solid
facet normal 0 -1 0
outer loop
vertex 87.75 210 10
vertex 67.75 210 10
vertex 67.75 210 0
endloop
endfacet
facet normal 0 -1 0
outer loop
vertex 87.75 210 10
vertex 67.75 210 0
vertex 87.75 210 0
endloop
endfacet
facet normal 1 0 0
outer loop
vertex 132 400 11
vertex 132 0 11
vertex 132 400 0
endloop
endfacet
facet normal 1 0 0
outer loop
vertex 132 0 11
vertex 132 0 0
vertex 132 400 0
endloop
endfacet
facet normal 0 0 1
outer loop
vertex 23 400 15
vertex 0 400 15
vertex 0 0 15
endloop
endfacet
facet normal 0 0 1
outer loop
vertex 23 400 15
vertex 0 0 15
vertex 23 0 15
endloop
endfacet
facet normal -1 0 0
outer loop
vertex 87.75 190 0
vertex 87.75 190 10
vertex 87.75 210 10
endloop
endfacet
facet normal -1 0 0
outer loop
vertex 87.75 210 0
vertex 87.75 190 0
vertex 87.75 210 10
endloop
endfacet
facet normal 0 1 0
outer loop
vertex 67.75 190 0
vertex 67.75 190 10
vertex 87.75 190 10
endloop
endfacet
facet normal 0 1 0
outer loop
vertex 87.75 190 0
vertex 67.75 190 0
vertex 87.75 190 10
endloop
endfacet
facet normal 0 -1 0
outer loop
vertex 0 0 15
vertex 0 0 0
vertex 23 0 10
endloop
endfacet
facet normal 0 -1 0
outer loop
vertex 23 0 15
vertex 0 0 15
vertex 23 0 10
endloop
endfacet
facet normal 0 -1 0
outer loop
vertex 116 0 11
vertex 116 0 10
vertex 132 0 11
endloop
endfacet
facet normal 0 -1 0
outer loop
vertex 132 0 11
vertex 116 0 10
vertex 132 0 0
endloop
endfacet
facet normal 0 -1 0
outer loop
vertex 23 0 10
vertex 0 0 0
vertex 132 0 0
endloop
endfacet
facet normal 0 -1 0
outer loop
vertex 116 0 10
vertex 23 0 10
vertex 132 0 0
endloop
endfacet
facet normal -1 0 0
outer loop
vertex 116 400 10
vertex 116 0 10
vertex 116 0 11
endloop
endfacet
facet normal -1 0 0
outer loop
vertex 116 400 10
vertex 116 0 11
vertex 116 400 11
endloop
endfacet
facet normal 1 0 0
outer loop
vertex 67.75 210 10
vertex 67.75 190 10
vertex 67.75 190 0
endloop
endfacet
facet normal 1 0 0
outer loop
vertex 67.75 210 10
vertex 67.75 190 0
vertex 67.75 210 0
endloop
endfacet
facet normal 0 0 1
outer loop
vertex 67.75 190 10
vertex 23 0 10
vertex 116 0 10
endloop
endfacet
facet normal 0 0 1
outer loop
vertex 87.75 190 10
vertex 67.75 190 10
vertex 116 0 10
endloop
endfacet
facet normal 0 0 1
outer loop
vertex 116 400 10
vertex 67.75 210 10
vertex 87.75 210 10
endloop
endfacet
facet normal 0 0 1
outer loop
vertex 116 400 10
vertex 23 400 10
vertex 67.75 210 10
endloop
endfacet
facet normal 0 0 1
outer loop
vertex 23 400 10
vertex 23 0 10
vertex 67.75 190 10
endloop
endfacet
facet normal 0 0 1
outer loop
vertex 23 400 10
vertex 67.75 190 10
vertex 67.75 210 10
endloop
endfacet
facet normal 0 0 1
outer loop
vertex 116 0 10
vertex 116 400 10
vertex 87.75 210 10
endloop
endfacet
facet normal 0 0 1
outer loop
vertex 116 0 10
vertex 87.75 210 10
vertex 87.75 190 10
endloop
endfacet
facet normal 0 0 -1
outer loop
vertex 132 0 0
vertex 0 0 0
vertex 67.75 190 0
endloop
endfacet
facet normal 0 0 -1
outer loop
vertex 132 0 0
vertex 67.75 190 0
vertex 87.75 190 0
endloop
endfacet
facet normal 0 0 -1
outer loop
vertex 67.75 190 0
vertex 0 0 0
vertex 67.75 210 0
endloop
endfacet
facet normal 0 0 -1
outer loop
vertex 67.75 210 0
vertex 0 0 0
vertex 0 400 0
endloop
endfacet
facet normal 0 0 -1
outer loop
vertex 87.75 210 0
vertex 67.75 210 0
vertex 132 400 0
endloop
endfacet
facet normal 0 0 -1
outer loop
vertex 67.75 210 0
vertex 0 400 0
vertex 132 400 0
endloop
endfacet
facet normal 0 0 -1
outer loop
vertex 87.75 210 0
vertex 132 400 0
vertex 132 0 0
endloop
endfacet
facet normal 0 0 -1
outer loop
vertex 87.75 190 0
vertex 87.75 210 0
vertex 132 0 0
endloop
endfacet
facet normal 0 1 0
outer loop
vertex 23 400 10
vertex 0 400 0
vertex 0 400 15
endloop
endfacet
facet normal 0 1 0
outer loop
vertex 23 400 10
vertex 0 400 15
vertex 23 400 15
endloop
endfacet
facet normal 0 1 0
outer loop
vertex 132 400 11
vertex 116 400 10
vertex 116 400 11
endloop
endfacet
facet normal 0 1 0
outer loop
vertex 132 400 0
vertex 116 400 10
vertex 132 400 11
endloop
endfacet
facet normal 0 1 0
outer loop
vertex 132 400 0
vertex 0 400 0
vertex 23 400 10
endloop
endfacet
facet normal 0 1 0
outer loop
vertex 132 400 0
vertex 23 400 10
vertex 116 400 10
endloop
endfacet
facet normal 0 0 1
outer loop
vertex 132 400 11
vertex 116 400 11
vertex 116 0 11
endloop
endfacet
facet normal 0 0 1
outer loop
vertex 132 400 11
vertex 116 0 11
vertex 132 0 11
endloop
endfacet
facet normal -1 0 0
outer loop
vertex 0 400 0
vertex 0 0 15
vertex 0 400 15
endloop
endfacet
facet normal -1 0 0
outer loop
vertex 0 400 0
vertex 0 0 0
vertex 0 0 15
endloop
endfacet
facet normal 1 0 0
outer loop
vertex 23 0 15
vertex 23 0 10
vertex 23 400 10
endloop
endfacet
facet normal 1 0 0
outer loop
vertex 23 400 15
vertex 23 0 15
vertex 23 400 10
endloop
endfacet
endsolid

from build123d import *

# Parameters (mm, degrees)
SKETCH_1_W          = 132
SKETCH_1_H          = 400
EXTRUDE_1_DEPTH     = 10
SKETCH_2_W          = 23
SKETCH_2_H          = 400
EXTRUDE_2_DEPTH     = 5
SKETCH_3_W          = 16
SKETCH_3_H          = 400
EXTRUDE_3_DEPTH     = 1
SKETCH_4_W          = 20
SKETCH_4_H          = 20
CUT_EXTRUDE_1_DEPTH = 11


with BuildPart() as part:
    # ｽｹｯﾁ1 → ﾎﾞｽ - 押し出し1 (new body)
    with BuildSketch(Plane.XY):
        with Locations((66, 200)):
            Rectangle(SKETCH_1_W, SKETCH_1_H)
    extrude(amount=EXTRUDE_1_DEPTH)

    # ｽｹｯﾁ2 → ﾎﾞｽ - 押し出し2 (add)
    with BuildSketch(Plane.XY.offset(10)):
        with Locations((11.5, 200)):
            Rectangle(SKETCH_2_W, SKETCH_2_H)
    extrude(amount=EXTRUDE_2_DEPTH)

    # ｽｹｯﾁ3 → ﾎﾞｽ - 押し出し3 (add)
    with BuildSketch(Plane.XY.offset(10)):
        with Locations((124, 200)):
            Rectangle(SKETCH_3_W, SKETCH_3_H)
    extrude(amount=EXTRUDE_3_DEPTH)

    # ｽｹｯﾁ4 → ｶｯﾄ - 押し出し1 (cut, through all)
    with BuildSketch(Plane.XY.offset(10)):
        with Locations((77.75, 200)):
            Rectangle(SKETCH_4_W, SKETCH_4_H)
    extrude(amount=-CUT_EXTRUDE_1_DEPTH, mode=Mode.SUBTRACT)


solid = part.part
